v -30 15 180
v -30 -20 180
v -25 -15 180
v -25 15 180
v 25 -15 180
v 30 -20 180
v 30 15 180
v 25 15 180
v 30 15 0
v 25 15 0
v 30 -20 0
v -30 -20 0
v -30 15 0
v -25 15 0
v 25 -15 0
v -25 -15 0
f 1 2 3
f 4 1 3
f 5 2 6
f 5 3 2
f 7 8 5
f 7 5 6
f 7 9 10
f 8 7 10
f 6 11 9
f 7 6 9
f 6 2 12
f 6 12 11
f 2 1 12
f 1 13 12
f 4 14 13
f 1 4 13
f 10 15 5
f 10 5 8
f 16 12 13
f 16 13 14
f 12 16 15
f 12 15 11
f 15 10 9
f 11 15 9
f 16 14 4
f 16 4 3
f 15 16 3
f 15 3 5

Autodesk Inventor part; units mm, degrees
ref_plane "YZ Plane" through (0, 0, 0) normal (1, 0, 0) x (0, 1, 0)
ref_plane "XZ Plane" through (0, 0, 0) normal (0, 1, 0) x (-1, 0, 0)
ref_plane "XY Plane" through (0, 0, 0) normal (0, 0, 1) x (1, 0, 0)
sketch "Sketch1" plane through (0, 0, 0) normal (0, 0, 1) x (1, 0, 0)
  line L0 (-25, -15) -> (25, -15)
  line L1 (25, -15) -> (25, 15)
  line L2 (25, 15) -> (-25, 15) construction
  line L3 (-25, 15) -> (-25, -15)
  line L4 (-25, -15) -> (25, 15) construction
  line L5 (25, -15) -> (-25, 15) construction
  line L6 (-25, 15) -> (-30, 15)
  line L7 (-30, 15) -> (-30, -20)
  line L8 (-30, -20) -> (30, -20)
  line L9 (30, -20) -> (30, 15)
  line L10 (30, 15) -> (25, 15)
  point P0 (0, 0)
  dimension "d0" = 50
  dimension "d1" = 30
  dimension "d2" = 5
  dimension "d3" = 35
  dimension "d4" = 60
extrude "Extrusion1" add sketch "Sketch1" along normal blind 180
properties part number "track 1832"
